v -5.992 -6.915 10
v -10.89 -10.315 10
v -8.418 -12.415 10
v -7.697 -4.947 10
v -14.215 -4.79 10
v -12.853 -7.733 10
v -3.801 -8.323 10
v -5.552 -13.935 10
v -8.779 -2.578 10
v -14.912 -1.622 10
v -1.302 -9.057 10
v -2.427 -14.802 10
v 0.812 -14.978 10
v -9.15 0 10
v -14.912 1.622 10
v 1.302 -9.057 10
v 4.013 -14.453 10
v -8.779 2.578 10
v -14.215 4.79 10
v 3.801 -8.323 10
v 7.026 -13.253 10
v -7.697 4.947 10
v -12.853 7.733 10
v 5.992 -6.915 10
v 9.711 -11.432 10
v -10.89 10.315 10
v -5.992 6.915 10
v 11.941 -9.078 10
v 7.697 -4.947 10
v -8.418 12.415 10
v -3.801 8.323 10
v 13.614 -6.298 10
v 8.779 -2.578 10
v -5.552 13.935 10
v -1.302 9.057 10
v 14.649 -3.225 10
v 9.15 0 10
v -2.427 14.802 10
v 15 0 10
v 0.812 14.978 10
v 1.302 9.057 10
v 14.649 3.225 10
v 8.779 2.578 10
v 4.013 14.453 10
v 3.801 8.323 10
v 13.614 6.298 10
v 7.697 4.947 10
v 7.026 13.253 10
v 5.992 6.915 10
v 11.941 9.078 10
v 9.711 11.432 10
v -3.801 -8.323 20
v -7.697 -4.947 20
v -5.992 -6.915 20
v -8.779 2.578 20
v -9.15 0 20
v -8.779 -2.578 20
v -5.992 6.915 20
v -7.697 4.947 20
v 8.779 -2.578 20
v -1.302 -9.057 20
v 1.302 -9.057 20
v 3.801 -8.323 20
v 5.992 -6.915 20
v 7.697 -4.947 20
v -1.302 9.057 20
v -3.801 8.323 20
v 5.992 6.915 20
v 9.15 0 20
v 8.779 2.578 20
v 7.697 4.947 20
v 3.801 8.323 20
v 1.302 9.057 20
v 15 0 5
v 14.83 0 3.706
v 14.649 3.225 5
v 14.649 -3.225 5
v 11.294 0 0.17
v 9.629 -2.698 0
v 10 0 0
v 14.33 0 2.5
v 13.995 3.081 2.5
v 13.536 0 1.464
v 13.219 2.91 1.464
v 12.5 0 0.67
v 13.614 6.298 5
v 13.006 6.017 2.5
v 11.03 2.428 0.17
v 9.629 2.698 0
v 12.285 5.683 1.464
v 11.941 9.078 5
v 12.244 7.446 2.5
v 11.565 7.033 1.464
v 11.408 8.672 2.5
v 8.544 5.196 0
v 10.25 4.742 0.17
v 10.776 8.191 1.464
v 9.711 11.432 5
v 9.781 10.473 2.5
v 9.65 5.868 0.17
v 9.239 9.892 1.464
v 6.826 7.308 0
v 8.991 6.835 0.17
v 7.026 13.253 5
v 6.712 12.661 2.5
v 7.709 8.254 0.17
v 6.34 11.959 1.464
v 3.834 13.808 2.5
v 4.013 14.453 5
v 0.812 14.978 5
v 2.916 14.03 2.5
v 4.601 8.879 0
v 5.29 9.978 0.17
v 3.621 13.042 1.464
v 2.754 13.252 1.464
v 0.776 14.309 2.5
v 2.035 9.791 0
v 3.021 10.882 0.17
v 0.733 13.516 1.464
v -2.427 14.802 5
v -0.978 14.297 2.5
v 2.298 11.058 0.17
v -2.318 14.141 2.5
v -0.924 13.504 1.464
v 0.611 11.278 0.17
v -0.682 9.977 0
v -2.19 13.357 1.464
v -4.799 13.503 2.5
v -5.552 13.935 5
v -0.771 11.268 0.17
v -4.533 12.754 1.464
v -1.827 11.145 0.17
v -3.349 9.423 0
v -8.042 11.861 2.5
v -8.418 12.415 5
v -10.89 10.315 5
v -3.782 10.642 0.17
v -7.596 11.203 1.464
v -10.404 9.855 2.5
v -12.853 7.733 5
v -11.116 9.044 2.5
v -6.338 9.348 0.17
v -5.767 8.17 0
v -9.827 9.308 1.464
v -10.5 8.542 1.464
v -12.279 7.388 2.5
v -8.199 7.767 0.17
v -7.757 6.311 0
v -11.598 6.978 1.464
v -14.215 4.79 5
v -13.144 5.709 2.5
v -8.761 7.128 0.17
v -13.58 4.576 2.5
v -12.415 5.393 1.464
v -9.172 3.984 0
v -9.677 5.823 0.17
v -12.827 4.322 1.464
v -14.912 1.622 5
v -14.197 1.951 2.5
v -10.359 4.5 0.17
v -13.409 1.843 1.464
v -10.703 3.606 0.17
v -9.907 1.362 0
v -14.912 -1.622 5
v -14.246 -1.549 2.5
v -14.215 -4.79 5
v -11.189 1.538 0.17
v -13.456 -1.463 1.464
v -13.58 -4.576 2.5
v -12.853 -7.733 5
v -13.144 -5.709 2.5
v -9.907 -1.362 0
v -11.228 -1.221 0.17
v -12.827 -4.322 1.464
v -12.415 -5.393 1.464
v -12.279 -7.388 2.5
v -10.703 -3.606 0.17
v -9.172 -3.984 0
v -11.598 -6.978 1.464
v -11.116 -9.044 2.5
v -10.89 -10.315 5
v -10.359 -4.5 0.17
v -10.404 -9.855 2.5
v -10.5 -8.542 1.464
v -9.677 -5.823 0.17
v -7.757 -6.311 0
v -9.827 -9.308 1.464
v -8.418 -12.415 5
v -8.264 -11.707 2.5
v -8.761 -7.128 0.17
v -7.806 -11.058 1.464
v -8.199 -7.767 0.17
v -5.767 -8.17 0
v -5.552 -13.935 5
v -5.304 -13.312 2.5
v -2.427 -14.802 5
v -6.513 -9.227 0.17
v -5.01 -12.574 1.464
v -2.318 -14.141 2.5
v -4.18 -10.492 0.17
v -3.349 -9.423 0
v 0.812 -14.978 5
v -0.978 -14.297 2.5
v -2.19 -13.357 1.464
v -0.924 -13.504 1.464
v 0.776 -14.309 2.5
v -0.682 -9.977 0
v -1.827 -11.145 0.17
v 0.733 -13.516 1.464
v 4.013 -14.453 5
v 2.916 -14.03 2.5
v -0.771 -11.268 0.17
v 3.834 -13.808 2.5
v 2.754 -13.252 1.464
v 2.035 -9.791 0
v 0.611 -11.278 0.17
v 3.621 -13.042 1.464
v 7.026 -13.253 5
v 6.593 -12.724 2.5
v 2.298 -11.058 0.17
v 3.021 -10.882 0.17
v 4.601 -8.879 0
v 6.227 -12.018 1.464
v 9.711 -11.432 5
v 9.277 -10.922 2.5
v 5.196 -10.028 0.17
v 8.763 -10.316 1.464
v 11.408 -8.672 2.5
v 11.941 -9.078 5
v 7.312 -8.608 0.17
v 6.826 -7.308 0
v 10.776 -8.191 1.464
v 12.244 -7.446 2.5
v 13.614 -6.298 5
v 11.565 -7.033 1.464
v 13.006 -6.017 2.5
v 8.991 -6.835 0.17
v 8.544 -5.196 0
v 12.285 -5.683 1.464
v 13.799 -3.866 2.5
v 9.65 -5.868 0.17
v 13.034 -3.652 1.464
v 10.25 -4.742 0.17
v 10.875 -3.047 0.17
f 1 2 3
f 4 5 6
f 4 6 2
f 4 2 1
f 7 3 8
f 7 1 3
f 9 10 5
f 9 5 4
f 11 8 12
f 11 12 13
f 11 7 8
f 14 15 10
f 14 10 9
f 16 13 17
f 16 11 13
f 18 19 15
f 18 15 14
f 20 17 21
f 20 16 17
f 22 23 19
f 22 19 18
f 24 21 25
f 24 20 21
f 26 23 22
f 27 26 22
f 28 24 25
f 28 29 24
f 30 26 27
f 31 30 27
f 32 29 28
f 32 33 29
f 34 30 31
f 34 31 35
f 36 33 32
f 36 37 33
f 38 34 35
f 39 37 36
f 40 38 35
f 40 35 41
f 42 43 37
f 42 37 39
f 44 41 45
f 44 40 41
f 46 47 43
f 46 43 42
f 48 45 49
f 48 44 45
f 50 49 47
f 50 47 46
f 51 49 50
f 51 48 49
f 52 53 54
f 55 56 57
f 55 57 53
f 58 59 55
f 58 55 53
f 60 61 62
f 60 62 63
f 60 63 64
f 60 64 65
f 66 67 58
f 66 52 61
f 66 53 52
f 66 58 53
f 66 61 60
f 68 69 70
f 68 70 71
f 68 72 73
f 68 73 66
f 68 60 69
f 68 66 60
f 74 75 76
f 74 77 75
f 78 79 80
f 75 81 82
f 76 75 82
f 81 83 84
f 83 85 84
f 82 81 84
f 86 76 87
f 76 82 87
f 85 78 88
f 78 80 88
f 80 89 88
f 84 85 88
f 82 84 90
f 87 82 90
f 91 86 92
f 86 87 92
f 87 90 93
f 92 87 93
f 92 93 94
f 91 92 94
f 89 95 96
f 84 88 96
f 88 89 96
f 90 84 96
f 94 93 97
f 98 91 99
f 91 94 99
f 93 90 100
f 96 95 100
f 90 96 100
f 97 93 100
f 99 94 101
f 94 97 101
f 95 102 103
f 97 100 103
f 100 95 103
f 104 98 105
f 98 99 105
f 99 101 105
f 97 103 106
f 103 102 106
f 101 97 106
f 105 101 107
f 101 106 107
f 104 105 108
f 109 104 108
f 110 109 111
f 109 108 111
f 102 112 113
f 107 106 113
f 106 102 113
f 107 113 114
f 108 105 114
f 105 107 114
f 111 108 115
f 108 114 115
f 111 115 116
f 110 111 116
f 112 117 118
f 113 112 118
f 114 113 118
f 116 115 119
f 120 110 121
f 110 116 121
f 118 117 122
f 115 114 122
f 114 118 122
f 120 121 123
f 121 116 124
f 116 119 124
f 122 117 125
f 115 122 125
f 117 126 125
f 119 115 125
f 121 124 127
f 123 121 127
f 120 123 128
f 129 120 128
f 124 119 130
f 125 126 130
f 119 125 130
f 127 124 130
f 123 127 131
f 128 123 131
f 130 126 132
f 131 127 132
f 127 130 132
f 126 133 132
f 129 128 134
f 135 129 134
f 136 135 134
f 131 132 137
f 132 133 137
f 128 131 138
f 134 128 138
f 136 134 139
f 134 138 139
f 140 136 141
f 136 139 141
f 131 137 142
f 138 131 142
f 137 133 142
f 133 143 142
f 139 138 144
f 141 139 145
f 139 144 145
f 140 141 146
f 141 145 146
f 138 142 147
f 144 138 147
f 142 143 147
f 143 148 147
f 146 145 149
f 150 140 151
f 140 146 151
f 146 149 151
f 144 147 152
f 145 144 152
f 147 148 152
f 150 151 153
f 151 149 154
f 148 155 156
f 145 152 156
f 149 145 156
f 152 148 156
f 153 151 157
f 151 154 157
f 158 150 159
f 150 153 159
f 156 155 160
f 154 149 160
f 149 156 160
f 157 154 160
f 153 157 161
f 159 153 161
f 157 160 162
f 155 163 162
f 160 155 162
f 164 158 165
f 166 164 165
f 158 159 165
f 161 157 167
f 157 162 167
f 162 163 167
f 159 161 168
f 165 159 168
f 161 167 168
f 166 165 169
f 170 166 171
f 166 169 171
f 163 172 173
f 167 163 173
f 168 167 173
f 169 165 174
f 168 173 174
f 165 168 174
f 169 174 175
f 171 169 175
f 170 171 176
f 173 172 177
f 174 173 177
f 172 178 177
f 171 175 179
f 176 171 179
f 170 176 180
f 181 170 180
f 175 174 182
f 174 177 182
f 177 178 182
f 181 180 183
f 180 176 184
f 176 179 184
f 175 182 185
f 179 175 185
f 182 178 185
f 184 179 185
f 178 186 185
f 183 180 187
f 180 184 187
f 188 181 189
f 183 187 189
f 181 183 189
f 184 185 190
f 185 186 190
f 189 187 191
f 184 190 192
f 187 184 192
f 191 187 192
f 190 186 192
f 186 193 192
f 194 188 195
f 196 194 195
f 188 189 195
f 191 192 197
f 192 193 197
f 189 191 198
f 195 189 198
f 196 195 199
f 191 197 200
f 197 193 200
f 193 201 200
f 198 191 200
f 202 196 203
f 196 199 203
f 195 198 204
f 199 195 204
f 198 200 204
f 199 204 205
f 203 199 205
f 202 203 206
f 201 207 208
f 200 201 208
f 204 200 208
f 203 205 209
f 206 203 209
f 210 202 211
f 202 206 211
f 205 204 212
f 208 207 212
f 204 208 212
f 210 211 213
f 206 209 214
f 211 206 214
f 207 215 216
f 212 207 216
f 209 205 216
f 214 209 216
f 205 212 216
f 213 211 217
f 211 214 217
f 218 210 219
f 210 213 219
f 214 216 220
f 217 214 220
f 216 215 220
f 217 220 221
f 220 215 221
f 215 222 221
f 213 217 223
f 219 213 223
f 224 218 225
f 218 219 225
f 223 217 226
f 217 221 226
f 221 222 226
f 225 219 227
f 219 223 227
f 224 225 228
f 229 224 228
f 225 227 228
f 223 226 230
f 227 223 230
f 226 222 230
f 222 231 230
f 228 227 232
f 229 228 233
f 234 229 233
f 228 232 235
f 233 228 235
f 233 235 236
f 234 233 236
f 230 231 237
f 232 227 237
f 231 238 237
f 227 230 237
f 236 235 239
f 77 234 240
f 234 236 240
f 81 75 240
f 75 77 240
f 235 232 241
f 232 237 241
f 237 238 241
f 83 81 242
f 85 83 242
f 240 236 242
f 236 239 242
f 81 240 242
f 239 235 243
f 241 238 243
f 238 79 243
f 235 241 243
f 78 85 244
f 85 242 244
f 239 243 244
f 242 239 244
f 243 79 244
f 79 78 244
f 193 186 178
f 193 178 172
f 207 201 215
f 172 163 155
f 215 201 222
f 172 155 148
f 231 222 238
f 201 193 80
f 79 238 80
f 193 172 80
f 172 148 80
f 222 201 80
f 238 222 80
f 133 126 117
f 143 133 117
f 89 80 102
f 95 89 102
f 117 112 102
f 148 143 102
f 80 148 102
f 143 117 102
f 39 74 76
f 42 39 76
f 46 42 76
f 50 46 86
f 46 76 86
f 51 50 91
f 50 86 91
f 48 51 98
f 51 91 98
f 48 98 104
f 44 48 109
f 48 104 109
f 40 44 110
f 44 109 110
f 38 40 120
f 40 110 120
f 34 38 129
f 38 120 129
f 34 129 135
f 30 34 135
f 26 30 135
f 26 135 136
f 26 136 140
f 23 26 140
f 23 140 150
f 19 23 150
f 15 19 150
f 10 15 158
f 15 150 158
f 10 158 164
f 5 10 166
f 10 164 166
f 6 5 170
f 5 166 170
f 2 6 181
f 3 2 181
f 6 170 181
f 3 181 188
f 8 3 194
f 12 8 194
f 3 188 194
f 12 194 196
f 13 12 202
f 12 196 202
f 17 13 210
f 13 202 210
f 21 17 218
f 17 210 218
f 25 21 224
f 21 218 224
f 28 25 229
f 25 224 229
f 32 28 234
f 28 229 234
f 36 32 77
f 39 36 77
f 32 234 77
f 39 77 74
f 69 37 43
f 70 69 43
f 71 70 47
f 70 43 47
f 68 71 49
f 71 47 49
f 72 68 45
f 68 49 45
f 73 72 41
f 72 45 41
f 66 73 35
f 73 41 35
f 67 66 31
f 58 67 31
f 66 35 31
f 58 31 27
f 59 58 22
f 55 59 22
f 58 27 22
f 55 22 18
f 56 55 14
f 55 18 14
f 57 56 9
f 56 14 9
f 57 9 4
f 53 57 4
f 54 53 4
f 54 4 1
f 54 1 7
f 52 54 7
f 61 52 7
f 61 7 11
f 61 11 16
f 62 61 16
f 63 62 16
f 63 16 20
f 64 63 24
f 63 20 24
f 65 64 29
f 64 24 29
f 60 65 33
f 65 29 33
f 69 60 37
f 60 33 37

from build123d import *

# Parameters (mm, degrees)
F0_R     = 15
F1_DEPTH = 10
F3_R     = 9.15
F4_DEPTH = 10
F5_R     = 5


with BuildPart() as f1:
    # F0 (on Top) → F1 (new body)
    with BuildSketch(Plane.XY):
        Circle(F0_R)
    extrude(amount=F1_DEPTH)

    # F3 (on offset) → F4 (join)
    with BuildSketch(Plane.XY.offset(10)):
        Circle(F3_R)
    extrude(amount=F4_DEPTH)

    # F5
    f5_edges = [f1.edges().sort_by_distance(p)[0] for p in [
        (-15, 0, 0),
    ]]
    fillet(f5_edges, radius=F5_R)


solid = f1.part
